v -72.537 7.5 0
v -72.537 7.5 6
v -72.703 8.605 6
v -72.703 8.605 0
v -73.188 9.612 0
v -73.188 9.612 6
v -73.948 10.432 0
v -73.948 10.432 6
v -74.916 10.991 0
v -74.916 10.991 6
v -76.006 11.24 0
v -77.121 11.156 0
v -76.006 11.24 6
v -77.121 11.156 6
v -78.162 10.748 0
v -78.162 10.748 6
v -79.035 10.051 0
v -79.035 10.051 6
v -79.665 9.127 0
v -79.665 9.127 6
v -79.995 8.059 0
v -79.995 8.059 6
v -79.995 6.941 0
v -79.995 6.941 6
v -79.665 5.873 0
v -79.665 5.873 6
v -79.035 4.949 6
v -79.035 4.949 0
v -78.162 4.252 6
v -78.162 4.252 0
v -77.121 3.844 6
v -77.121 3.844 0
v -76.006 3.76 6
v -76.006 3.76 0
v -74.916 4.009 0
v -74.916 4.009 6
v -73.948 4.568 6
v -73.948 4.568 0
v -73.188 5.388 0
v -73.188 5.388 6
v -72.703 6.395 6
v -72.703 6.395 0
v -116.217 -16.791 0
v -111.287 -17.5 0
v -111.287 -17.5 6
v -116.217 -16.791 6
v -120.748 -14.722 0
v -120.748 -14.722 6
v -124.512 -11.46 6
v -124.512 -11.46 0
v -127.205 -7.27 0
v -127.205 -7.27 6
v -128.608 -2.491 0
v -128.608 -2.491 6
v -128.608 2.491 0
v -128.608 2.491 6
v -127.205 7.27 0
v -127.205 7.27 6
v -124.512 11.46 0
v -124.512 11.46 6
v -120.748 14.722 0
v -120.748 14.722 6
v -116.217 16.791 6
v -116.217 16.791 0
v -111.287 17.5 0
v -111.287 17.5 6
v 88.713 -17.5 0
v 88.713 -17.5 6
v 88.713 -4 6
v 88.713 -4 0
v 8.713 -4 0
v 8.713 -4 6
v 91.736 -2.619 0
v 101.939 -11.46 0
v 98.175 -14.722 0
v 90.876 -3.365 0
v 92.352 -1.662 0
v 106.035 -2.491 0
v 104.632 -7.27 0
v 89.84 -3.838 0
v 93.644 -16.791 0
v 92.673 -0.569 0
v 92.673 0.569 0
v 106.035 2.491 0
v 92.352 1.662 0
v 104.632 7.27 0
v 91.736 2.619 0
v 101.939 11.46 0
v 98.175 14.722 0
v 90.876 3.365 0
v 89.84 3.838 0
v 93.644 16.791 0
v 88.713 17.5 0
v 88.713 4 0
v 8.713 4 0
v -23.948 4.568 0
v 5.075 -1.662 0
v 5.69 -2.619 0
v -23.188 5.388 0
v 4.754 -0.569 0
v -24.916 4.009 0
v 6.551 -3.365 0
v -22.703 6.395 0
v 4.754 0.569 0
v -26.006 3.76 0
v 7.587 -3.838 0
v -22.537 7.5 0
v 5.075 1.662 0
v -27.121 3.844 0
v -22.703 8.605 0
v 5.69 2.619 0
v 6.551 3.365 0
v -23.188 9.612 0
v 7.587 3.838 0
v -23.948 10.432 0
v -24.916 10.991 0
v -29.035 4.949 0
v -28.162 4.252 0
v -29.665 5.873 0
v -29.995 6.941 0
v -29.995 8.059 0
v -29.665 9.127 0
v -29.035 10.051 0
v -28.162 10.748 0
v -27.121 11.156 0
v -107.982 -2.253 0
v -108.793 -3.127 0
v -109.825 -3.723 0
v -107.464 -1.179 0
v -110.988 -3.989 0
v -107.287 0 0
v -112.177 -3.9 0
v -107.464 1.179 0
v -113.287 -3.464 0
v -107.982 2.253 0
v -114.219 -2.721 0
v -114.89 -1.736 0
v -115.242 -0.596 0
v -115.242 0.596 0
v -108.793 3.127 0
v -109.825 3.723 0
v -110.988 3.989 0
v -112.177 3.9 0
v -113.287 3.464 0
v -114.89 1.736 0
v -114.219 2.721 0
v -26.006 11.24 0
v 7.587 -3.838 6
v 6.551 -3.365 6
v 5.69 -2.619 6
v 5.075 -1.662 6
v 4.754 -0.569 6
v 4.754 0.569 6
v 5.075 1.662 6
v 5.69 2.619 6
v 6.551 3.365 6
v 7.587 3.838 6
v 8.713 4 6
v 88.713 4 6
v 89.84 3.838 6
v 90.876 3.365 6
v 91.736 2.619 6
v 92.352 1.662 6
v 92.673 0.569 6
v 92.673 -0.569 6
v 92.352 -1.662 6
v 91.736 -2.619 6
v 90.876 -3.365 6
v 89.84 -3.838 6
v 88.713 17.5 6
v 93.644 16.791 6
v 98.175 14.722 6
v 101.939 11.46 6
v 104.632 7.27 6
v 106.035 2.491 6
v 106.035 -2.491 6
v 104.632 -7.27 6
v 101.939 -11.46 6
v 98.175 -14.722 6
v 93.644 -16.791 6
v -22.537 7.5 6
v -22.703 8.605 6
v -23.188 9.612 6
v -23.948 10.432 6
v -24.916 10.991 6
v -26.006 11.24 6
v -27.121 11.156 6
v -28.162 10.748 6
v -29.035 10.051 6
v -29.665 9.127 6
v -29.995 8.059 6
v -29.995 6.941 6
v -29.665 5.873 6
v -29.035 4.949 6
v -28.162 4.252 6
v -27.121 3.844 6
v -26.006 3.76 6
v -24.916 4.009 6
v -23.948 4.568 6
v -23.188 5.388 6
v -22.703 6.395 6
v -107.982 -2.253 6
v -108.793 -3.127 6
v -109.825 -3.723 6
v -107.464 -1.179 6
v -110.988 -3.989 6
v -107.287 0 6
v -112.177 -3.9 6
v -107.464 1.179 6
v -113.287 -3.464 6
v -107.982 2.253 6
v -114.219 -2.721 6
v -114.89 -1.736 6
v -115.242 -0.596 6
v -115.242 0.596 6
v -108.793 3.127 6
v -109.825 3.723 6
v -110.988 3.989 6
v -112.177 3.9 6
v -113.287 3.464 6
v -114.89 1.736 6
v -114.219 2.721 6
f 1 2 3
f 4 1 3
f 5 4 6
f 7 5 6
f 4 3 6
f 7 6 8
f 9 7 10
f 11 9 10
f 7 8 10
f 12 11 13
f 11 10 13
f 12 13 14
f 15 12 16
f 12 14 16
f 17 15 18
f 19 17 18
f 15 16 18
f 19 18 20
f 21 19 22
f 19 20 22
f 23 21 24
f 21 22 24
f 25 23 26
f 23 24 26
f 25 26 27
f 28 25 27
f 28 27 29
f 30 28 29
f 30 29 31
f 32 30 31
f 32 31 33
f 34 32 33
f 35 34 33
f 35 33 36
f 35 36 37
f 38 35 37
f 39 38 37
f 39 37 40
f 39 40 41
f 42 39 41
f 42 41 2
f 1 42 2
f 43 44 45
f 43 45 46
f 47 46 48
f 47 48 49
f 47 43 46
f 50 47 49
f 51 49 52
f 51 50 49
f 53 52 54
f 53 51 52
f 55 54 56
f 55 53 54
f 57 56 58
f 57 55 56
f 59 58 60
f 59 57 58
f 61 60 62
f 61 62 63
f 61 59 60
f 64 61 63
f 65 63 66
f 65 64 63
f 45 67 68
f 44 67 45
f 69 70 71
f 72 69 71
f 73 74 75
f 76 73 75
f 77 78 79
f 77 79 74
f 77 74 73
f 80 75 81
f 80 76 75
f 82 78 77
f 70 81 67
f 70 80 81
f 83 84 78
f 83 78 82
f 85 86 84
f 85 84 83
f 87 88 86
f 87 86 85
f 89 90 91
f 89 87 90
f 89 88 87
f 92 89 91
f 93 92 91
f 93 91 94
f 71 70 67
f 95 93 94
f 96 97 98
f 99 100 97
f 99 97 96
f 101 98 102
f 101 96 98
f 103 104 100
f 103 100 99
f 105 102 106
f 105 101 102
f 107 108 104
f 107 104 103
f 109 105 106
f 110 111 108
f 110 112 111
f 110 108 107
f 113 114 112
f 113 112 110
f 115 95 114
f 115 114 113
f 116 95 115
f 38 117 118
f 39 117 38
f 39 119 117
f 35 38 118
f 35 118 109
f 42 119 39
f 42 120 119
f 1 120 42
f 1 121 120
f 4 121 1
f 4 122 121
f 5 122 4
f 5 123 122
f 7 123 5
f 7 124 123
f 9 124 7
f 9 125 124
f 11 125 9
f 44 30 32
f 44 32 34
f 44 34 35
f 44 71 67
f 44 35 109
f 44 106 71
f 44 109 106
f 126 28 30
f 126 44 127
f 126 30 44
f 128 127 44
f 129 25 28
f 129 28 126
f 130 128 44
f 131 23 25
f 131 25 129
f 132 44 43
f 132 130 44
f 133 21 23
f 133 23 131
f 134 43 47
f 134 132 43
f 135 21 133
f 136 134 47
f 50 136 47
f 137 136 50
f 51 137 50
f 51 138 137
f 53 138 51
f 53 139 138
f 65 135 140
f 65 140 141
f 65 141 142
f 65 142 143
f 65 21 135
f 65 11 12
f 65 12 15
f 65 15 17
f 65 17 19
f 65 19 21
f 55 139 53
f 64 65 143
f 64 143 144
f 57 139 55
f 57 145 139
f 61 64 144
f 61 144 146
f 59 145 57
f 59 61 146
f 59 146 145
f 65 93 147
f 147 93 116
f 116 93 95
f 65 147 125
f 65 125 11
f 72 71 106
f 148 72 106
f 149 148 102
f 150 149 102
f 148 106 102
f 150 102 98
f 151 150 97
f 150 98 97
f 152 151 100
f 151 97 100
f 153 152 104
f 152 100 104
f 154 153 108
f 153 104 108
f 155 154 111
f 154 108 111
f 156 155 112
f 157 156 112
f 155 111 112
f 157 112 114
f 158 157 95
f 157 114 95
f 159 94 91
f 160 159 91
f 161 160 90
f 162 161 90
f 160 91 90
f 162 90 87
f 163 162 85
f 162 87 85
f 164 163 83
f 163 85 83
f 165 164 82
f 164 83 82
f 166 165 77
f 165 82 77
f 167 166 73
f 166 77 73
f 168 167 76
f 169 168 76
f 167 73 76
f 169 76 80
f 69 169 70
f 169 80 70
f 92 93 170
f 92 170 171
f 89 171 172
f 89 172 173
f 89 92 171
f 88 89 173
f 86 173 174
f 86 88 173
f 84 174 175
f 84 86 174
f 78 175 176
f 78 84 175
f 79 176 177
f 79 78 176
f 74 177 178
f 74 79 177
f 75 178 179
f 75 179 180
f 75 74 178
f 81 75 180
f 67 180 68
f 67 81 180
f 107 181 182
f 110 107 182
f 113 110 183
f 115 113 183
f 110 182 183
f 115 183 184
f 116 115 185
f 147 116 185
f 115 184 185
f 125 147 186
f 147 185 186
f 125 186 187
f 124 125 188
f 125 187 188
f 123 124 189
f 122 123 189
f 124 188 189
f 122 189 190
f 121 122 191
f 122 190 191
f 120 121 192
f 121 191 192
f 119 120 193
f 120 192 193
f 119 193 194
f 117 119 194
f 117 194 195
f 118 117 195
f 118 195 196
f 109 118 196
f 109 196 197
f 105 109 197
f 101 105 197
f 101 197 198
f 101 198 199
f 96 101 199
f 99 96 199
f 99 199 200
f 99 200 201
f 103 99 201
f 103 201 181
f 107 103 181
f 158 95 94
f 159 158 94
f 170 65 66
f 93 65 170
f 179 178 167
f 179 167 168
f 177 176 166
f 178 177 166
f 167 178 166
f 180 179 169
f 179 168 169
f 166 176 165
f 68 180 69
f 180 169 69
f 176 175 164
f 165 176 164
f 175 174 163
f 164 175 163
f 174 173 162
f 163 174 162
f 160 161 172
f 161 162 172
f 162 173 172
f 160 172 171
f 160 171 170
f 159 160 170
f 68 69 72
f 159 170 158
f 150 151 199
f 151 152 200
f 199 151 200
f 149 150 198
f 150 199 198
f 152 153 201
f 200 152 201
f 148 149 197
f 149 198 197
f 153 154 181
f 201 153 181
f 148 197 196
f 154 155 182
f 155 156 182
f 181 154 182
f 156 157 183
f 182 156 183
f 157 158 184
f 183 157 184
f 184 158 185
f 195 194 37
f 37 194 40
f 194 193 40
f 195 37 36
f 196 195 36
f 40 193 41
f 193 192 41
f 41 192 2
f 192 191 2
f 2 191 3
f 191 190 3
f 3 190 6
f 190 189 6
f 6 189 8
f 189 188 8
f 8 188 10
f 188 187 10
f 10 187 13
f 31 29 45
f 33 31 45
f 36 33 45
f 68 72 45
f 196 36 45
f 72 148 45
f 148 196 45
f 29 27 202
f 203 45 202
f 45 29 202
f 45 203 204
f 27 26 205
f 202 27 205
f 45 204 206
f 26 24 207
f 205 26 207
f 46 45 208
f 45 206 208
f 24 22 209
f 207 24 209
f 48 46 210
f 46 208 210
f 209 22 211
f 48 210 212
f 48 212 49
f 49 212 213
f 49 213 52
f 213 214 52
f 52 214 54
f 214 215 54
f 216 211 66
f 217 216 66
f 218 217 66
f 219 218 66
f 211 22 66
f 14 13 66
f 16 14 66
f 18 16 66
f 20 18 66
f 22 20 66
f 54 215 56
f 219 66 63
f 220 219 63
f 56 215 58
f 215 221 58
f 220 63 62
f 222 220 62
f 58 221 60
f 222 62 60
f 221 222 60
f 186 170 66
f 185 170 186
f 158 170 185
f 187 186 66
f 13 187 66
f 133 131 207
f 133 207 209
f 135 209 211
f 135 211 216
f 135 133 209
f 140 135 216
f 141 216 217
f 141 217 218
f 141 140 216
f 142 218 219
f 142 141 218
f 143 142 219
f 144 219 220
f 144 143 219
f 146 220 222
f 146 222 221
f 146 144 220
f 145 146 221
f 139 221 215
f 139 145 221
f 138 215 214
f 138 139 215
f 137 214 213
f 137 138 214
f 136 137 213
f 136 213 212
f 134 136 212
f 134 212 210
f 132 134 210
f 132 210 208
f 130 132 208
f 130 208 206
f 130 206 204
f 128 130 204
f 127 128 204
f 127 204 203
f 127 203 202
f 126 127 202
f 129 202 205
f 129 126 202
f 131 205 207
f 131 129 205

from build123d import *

# Parameters (mm, degrees)
ESQUISSE1_R             = 4
BOSS_EXTRU_1_DEPTH      = 6
ENL_V_MAT_EXTRU_1_REACH = 132.108
ESQUISSE2_R             = 3.75


with BuildPart() as part:
    # Esquisse1 → Boss.-Extru.1 (new body)
    with BuildSketch(Plane.XY):
        with BuildLine():
            Line((-111.286517575, 17.5), (88.713482425, 17.5))
            ThreePointArc((88.713482425, 17.5), (106.213482425, 0), (88.713482425, -17.5))
            Line((88.713482425, -17.5), (-111.286517575, -17.5))
            ThreePointArc((-111.286517575, -17.5), (-128.786517575, 0), (-111.286517575, 17.5))
        make_face()
        with Locations((-111.286517575, 0)):
            Circle(ESQUISSE1_R, mode=Mode.SUBTRACT)
        with BuildLine():
            Line((88.713482425, -4), (8.713482425, -4))
            ThreePointArc((8.713482425, -4), (4.713482425, 0), (8.713482425, 4))
            Line((8.713482425, 4), (88.713482425, 4))
            ThreePointArc((88.713482425, 4), (92.713482425, 0), (88.713482425, -4))
        make_face(mode=Mode.SUBTRACT)
    extrude(amount=BOSS_EXTRU_1_DEPTH)

    # Esquisse2 → Enlèv. mat.-Extru.1 (cut, up to next)
    with BuildSketch(Plane.XY.offset(6), mode=Mode.PRIVATE) as enl_v_mat_extru_1_sk1:
        with Locations((-76.286517575, 7.5)):
            Circle(ESQUISSE2_R)
    enl_v_mat_extru_1_tool1 = extrude(enl_v_mat_extru_1_sk1.sketch, amount=-ENL_V_MAT_EXTRU_1_REACH, mode=Mode.PRIVATE) & part.part
    # Esquisse2 → Enlèv. mat.-Extru.1 (cut, up to next)
    with BuildSketch(Plane.XY.offset(6), mode=Mode.PRIVATE) as enl_v_mat_extru_1_sk2:
        with Locations((-26.286517575, 7.5)):
            Circle(ESQUISSE2_R)
    enl_v_mat_extru_1_tool2 = extrude(enl_v_mat_extru_1_sk2.sketch, amount=-ENL_V_MAT_EXTRU_1_REACH, mode=Mode.PRIVATE) & part.part
    add(enl_v_mat_extru_1_tool1.solids().sort_by_distance((-76.286518, 7.5, 6))[0], mode=Mode.SUBTRACT)
    add(enl_v_mat_extru_1_tool2.solids().sort_by_distance((-26.286518, 7.5, 6))[0], mode=Mode.SUBTRACT)


solid = part.part
